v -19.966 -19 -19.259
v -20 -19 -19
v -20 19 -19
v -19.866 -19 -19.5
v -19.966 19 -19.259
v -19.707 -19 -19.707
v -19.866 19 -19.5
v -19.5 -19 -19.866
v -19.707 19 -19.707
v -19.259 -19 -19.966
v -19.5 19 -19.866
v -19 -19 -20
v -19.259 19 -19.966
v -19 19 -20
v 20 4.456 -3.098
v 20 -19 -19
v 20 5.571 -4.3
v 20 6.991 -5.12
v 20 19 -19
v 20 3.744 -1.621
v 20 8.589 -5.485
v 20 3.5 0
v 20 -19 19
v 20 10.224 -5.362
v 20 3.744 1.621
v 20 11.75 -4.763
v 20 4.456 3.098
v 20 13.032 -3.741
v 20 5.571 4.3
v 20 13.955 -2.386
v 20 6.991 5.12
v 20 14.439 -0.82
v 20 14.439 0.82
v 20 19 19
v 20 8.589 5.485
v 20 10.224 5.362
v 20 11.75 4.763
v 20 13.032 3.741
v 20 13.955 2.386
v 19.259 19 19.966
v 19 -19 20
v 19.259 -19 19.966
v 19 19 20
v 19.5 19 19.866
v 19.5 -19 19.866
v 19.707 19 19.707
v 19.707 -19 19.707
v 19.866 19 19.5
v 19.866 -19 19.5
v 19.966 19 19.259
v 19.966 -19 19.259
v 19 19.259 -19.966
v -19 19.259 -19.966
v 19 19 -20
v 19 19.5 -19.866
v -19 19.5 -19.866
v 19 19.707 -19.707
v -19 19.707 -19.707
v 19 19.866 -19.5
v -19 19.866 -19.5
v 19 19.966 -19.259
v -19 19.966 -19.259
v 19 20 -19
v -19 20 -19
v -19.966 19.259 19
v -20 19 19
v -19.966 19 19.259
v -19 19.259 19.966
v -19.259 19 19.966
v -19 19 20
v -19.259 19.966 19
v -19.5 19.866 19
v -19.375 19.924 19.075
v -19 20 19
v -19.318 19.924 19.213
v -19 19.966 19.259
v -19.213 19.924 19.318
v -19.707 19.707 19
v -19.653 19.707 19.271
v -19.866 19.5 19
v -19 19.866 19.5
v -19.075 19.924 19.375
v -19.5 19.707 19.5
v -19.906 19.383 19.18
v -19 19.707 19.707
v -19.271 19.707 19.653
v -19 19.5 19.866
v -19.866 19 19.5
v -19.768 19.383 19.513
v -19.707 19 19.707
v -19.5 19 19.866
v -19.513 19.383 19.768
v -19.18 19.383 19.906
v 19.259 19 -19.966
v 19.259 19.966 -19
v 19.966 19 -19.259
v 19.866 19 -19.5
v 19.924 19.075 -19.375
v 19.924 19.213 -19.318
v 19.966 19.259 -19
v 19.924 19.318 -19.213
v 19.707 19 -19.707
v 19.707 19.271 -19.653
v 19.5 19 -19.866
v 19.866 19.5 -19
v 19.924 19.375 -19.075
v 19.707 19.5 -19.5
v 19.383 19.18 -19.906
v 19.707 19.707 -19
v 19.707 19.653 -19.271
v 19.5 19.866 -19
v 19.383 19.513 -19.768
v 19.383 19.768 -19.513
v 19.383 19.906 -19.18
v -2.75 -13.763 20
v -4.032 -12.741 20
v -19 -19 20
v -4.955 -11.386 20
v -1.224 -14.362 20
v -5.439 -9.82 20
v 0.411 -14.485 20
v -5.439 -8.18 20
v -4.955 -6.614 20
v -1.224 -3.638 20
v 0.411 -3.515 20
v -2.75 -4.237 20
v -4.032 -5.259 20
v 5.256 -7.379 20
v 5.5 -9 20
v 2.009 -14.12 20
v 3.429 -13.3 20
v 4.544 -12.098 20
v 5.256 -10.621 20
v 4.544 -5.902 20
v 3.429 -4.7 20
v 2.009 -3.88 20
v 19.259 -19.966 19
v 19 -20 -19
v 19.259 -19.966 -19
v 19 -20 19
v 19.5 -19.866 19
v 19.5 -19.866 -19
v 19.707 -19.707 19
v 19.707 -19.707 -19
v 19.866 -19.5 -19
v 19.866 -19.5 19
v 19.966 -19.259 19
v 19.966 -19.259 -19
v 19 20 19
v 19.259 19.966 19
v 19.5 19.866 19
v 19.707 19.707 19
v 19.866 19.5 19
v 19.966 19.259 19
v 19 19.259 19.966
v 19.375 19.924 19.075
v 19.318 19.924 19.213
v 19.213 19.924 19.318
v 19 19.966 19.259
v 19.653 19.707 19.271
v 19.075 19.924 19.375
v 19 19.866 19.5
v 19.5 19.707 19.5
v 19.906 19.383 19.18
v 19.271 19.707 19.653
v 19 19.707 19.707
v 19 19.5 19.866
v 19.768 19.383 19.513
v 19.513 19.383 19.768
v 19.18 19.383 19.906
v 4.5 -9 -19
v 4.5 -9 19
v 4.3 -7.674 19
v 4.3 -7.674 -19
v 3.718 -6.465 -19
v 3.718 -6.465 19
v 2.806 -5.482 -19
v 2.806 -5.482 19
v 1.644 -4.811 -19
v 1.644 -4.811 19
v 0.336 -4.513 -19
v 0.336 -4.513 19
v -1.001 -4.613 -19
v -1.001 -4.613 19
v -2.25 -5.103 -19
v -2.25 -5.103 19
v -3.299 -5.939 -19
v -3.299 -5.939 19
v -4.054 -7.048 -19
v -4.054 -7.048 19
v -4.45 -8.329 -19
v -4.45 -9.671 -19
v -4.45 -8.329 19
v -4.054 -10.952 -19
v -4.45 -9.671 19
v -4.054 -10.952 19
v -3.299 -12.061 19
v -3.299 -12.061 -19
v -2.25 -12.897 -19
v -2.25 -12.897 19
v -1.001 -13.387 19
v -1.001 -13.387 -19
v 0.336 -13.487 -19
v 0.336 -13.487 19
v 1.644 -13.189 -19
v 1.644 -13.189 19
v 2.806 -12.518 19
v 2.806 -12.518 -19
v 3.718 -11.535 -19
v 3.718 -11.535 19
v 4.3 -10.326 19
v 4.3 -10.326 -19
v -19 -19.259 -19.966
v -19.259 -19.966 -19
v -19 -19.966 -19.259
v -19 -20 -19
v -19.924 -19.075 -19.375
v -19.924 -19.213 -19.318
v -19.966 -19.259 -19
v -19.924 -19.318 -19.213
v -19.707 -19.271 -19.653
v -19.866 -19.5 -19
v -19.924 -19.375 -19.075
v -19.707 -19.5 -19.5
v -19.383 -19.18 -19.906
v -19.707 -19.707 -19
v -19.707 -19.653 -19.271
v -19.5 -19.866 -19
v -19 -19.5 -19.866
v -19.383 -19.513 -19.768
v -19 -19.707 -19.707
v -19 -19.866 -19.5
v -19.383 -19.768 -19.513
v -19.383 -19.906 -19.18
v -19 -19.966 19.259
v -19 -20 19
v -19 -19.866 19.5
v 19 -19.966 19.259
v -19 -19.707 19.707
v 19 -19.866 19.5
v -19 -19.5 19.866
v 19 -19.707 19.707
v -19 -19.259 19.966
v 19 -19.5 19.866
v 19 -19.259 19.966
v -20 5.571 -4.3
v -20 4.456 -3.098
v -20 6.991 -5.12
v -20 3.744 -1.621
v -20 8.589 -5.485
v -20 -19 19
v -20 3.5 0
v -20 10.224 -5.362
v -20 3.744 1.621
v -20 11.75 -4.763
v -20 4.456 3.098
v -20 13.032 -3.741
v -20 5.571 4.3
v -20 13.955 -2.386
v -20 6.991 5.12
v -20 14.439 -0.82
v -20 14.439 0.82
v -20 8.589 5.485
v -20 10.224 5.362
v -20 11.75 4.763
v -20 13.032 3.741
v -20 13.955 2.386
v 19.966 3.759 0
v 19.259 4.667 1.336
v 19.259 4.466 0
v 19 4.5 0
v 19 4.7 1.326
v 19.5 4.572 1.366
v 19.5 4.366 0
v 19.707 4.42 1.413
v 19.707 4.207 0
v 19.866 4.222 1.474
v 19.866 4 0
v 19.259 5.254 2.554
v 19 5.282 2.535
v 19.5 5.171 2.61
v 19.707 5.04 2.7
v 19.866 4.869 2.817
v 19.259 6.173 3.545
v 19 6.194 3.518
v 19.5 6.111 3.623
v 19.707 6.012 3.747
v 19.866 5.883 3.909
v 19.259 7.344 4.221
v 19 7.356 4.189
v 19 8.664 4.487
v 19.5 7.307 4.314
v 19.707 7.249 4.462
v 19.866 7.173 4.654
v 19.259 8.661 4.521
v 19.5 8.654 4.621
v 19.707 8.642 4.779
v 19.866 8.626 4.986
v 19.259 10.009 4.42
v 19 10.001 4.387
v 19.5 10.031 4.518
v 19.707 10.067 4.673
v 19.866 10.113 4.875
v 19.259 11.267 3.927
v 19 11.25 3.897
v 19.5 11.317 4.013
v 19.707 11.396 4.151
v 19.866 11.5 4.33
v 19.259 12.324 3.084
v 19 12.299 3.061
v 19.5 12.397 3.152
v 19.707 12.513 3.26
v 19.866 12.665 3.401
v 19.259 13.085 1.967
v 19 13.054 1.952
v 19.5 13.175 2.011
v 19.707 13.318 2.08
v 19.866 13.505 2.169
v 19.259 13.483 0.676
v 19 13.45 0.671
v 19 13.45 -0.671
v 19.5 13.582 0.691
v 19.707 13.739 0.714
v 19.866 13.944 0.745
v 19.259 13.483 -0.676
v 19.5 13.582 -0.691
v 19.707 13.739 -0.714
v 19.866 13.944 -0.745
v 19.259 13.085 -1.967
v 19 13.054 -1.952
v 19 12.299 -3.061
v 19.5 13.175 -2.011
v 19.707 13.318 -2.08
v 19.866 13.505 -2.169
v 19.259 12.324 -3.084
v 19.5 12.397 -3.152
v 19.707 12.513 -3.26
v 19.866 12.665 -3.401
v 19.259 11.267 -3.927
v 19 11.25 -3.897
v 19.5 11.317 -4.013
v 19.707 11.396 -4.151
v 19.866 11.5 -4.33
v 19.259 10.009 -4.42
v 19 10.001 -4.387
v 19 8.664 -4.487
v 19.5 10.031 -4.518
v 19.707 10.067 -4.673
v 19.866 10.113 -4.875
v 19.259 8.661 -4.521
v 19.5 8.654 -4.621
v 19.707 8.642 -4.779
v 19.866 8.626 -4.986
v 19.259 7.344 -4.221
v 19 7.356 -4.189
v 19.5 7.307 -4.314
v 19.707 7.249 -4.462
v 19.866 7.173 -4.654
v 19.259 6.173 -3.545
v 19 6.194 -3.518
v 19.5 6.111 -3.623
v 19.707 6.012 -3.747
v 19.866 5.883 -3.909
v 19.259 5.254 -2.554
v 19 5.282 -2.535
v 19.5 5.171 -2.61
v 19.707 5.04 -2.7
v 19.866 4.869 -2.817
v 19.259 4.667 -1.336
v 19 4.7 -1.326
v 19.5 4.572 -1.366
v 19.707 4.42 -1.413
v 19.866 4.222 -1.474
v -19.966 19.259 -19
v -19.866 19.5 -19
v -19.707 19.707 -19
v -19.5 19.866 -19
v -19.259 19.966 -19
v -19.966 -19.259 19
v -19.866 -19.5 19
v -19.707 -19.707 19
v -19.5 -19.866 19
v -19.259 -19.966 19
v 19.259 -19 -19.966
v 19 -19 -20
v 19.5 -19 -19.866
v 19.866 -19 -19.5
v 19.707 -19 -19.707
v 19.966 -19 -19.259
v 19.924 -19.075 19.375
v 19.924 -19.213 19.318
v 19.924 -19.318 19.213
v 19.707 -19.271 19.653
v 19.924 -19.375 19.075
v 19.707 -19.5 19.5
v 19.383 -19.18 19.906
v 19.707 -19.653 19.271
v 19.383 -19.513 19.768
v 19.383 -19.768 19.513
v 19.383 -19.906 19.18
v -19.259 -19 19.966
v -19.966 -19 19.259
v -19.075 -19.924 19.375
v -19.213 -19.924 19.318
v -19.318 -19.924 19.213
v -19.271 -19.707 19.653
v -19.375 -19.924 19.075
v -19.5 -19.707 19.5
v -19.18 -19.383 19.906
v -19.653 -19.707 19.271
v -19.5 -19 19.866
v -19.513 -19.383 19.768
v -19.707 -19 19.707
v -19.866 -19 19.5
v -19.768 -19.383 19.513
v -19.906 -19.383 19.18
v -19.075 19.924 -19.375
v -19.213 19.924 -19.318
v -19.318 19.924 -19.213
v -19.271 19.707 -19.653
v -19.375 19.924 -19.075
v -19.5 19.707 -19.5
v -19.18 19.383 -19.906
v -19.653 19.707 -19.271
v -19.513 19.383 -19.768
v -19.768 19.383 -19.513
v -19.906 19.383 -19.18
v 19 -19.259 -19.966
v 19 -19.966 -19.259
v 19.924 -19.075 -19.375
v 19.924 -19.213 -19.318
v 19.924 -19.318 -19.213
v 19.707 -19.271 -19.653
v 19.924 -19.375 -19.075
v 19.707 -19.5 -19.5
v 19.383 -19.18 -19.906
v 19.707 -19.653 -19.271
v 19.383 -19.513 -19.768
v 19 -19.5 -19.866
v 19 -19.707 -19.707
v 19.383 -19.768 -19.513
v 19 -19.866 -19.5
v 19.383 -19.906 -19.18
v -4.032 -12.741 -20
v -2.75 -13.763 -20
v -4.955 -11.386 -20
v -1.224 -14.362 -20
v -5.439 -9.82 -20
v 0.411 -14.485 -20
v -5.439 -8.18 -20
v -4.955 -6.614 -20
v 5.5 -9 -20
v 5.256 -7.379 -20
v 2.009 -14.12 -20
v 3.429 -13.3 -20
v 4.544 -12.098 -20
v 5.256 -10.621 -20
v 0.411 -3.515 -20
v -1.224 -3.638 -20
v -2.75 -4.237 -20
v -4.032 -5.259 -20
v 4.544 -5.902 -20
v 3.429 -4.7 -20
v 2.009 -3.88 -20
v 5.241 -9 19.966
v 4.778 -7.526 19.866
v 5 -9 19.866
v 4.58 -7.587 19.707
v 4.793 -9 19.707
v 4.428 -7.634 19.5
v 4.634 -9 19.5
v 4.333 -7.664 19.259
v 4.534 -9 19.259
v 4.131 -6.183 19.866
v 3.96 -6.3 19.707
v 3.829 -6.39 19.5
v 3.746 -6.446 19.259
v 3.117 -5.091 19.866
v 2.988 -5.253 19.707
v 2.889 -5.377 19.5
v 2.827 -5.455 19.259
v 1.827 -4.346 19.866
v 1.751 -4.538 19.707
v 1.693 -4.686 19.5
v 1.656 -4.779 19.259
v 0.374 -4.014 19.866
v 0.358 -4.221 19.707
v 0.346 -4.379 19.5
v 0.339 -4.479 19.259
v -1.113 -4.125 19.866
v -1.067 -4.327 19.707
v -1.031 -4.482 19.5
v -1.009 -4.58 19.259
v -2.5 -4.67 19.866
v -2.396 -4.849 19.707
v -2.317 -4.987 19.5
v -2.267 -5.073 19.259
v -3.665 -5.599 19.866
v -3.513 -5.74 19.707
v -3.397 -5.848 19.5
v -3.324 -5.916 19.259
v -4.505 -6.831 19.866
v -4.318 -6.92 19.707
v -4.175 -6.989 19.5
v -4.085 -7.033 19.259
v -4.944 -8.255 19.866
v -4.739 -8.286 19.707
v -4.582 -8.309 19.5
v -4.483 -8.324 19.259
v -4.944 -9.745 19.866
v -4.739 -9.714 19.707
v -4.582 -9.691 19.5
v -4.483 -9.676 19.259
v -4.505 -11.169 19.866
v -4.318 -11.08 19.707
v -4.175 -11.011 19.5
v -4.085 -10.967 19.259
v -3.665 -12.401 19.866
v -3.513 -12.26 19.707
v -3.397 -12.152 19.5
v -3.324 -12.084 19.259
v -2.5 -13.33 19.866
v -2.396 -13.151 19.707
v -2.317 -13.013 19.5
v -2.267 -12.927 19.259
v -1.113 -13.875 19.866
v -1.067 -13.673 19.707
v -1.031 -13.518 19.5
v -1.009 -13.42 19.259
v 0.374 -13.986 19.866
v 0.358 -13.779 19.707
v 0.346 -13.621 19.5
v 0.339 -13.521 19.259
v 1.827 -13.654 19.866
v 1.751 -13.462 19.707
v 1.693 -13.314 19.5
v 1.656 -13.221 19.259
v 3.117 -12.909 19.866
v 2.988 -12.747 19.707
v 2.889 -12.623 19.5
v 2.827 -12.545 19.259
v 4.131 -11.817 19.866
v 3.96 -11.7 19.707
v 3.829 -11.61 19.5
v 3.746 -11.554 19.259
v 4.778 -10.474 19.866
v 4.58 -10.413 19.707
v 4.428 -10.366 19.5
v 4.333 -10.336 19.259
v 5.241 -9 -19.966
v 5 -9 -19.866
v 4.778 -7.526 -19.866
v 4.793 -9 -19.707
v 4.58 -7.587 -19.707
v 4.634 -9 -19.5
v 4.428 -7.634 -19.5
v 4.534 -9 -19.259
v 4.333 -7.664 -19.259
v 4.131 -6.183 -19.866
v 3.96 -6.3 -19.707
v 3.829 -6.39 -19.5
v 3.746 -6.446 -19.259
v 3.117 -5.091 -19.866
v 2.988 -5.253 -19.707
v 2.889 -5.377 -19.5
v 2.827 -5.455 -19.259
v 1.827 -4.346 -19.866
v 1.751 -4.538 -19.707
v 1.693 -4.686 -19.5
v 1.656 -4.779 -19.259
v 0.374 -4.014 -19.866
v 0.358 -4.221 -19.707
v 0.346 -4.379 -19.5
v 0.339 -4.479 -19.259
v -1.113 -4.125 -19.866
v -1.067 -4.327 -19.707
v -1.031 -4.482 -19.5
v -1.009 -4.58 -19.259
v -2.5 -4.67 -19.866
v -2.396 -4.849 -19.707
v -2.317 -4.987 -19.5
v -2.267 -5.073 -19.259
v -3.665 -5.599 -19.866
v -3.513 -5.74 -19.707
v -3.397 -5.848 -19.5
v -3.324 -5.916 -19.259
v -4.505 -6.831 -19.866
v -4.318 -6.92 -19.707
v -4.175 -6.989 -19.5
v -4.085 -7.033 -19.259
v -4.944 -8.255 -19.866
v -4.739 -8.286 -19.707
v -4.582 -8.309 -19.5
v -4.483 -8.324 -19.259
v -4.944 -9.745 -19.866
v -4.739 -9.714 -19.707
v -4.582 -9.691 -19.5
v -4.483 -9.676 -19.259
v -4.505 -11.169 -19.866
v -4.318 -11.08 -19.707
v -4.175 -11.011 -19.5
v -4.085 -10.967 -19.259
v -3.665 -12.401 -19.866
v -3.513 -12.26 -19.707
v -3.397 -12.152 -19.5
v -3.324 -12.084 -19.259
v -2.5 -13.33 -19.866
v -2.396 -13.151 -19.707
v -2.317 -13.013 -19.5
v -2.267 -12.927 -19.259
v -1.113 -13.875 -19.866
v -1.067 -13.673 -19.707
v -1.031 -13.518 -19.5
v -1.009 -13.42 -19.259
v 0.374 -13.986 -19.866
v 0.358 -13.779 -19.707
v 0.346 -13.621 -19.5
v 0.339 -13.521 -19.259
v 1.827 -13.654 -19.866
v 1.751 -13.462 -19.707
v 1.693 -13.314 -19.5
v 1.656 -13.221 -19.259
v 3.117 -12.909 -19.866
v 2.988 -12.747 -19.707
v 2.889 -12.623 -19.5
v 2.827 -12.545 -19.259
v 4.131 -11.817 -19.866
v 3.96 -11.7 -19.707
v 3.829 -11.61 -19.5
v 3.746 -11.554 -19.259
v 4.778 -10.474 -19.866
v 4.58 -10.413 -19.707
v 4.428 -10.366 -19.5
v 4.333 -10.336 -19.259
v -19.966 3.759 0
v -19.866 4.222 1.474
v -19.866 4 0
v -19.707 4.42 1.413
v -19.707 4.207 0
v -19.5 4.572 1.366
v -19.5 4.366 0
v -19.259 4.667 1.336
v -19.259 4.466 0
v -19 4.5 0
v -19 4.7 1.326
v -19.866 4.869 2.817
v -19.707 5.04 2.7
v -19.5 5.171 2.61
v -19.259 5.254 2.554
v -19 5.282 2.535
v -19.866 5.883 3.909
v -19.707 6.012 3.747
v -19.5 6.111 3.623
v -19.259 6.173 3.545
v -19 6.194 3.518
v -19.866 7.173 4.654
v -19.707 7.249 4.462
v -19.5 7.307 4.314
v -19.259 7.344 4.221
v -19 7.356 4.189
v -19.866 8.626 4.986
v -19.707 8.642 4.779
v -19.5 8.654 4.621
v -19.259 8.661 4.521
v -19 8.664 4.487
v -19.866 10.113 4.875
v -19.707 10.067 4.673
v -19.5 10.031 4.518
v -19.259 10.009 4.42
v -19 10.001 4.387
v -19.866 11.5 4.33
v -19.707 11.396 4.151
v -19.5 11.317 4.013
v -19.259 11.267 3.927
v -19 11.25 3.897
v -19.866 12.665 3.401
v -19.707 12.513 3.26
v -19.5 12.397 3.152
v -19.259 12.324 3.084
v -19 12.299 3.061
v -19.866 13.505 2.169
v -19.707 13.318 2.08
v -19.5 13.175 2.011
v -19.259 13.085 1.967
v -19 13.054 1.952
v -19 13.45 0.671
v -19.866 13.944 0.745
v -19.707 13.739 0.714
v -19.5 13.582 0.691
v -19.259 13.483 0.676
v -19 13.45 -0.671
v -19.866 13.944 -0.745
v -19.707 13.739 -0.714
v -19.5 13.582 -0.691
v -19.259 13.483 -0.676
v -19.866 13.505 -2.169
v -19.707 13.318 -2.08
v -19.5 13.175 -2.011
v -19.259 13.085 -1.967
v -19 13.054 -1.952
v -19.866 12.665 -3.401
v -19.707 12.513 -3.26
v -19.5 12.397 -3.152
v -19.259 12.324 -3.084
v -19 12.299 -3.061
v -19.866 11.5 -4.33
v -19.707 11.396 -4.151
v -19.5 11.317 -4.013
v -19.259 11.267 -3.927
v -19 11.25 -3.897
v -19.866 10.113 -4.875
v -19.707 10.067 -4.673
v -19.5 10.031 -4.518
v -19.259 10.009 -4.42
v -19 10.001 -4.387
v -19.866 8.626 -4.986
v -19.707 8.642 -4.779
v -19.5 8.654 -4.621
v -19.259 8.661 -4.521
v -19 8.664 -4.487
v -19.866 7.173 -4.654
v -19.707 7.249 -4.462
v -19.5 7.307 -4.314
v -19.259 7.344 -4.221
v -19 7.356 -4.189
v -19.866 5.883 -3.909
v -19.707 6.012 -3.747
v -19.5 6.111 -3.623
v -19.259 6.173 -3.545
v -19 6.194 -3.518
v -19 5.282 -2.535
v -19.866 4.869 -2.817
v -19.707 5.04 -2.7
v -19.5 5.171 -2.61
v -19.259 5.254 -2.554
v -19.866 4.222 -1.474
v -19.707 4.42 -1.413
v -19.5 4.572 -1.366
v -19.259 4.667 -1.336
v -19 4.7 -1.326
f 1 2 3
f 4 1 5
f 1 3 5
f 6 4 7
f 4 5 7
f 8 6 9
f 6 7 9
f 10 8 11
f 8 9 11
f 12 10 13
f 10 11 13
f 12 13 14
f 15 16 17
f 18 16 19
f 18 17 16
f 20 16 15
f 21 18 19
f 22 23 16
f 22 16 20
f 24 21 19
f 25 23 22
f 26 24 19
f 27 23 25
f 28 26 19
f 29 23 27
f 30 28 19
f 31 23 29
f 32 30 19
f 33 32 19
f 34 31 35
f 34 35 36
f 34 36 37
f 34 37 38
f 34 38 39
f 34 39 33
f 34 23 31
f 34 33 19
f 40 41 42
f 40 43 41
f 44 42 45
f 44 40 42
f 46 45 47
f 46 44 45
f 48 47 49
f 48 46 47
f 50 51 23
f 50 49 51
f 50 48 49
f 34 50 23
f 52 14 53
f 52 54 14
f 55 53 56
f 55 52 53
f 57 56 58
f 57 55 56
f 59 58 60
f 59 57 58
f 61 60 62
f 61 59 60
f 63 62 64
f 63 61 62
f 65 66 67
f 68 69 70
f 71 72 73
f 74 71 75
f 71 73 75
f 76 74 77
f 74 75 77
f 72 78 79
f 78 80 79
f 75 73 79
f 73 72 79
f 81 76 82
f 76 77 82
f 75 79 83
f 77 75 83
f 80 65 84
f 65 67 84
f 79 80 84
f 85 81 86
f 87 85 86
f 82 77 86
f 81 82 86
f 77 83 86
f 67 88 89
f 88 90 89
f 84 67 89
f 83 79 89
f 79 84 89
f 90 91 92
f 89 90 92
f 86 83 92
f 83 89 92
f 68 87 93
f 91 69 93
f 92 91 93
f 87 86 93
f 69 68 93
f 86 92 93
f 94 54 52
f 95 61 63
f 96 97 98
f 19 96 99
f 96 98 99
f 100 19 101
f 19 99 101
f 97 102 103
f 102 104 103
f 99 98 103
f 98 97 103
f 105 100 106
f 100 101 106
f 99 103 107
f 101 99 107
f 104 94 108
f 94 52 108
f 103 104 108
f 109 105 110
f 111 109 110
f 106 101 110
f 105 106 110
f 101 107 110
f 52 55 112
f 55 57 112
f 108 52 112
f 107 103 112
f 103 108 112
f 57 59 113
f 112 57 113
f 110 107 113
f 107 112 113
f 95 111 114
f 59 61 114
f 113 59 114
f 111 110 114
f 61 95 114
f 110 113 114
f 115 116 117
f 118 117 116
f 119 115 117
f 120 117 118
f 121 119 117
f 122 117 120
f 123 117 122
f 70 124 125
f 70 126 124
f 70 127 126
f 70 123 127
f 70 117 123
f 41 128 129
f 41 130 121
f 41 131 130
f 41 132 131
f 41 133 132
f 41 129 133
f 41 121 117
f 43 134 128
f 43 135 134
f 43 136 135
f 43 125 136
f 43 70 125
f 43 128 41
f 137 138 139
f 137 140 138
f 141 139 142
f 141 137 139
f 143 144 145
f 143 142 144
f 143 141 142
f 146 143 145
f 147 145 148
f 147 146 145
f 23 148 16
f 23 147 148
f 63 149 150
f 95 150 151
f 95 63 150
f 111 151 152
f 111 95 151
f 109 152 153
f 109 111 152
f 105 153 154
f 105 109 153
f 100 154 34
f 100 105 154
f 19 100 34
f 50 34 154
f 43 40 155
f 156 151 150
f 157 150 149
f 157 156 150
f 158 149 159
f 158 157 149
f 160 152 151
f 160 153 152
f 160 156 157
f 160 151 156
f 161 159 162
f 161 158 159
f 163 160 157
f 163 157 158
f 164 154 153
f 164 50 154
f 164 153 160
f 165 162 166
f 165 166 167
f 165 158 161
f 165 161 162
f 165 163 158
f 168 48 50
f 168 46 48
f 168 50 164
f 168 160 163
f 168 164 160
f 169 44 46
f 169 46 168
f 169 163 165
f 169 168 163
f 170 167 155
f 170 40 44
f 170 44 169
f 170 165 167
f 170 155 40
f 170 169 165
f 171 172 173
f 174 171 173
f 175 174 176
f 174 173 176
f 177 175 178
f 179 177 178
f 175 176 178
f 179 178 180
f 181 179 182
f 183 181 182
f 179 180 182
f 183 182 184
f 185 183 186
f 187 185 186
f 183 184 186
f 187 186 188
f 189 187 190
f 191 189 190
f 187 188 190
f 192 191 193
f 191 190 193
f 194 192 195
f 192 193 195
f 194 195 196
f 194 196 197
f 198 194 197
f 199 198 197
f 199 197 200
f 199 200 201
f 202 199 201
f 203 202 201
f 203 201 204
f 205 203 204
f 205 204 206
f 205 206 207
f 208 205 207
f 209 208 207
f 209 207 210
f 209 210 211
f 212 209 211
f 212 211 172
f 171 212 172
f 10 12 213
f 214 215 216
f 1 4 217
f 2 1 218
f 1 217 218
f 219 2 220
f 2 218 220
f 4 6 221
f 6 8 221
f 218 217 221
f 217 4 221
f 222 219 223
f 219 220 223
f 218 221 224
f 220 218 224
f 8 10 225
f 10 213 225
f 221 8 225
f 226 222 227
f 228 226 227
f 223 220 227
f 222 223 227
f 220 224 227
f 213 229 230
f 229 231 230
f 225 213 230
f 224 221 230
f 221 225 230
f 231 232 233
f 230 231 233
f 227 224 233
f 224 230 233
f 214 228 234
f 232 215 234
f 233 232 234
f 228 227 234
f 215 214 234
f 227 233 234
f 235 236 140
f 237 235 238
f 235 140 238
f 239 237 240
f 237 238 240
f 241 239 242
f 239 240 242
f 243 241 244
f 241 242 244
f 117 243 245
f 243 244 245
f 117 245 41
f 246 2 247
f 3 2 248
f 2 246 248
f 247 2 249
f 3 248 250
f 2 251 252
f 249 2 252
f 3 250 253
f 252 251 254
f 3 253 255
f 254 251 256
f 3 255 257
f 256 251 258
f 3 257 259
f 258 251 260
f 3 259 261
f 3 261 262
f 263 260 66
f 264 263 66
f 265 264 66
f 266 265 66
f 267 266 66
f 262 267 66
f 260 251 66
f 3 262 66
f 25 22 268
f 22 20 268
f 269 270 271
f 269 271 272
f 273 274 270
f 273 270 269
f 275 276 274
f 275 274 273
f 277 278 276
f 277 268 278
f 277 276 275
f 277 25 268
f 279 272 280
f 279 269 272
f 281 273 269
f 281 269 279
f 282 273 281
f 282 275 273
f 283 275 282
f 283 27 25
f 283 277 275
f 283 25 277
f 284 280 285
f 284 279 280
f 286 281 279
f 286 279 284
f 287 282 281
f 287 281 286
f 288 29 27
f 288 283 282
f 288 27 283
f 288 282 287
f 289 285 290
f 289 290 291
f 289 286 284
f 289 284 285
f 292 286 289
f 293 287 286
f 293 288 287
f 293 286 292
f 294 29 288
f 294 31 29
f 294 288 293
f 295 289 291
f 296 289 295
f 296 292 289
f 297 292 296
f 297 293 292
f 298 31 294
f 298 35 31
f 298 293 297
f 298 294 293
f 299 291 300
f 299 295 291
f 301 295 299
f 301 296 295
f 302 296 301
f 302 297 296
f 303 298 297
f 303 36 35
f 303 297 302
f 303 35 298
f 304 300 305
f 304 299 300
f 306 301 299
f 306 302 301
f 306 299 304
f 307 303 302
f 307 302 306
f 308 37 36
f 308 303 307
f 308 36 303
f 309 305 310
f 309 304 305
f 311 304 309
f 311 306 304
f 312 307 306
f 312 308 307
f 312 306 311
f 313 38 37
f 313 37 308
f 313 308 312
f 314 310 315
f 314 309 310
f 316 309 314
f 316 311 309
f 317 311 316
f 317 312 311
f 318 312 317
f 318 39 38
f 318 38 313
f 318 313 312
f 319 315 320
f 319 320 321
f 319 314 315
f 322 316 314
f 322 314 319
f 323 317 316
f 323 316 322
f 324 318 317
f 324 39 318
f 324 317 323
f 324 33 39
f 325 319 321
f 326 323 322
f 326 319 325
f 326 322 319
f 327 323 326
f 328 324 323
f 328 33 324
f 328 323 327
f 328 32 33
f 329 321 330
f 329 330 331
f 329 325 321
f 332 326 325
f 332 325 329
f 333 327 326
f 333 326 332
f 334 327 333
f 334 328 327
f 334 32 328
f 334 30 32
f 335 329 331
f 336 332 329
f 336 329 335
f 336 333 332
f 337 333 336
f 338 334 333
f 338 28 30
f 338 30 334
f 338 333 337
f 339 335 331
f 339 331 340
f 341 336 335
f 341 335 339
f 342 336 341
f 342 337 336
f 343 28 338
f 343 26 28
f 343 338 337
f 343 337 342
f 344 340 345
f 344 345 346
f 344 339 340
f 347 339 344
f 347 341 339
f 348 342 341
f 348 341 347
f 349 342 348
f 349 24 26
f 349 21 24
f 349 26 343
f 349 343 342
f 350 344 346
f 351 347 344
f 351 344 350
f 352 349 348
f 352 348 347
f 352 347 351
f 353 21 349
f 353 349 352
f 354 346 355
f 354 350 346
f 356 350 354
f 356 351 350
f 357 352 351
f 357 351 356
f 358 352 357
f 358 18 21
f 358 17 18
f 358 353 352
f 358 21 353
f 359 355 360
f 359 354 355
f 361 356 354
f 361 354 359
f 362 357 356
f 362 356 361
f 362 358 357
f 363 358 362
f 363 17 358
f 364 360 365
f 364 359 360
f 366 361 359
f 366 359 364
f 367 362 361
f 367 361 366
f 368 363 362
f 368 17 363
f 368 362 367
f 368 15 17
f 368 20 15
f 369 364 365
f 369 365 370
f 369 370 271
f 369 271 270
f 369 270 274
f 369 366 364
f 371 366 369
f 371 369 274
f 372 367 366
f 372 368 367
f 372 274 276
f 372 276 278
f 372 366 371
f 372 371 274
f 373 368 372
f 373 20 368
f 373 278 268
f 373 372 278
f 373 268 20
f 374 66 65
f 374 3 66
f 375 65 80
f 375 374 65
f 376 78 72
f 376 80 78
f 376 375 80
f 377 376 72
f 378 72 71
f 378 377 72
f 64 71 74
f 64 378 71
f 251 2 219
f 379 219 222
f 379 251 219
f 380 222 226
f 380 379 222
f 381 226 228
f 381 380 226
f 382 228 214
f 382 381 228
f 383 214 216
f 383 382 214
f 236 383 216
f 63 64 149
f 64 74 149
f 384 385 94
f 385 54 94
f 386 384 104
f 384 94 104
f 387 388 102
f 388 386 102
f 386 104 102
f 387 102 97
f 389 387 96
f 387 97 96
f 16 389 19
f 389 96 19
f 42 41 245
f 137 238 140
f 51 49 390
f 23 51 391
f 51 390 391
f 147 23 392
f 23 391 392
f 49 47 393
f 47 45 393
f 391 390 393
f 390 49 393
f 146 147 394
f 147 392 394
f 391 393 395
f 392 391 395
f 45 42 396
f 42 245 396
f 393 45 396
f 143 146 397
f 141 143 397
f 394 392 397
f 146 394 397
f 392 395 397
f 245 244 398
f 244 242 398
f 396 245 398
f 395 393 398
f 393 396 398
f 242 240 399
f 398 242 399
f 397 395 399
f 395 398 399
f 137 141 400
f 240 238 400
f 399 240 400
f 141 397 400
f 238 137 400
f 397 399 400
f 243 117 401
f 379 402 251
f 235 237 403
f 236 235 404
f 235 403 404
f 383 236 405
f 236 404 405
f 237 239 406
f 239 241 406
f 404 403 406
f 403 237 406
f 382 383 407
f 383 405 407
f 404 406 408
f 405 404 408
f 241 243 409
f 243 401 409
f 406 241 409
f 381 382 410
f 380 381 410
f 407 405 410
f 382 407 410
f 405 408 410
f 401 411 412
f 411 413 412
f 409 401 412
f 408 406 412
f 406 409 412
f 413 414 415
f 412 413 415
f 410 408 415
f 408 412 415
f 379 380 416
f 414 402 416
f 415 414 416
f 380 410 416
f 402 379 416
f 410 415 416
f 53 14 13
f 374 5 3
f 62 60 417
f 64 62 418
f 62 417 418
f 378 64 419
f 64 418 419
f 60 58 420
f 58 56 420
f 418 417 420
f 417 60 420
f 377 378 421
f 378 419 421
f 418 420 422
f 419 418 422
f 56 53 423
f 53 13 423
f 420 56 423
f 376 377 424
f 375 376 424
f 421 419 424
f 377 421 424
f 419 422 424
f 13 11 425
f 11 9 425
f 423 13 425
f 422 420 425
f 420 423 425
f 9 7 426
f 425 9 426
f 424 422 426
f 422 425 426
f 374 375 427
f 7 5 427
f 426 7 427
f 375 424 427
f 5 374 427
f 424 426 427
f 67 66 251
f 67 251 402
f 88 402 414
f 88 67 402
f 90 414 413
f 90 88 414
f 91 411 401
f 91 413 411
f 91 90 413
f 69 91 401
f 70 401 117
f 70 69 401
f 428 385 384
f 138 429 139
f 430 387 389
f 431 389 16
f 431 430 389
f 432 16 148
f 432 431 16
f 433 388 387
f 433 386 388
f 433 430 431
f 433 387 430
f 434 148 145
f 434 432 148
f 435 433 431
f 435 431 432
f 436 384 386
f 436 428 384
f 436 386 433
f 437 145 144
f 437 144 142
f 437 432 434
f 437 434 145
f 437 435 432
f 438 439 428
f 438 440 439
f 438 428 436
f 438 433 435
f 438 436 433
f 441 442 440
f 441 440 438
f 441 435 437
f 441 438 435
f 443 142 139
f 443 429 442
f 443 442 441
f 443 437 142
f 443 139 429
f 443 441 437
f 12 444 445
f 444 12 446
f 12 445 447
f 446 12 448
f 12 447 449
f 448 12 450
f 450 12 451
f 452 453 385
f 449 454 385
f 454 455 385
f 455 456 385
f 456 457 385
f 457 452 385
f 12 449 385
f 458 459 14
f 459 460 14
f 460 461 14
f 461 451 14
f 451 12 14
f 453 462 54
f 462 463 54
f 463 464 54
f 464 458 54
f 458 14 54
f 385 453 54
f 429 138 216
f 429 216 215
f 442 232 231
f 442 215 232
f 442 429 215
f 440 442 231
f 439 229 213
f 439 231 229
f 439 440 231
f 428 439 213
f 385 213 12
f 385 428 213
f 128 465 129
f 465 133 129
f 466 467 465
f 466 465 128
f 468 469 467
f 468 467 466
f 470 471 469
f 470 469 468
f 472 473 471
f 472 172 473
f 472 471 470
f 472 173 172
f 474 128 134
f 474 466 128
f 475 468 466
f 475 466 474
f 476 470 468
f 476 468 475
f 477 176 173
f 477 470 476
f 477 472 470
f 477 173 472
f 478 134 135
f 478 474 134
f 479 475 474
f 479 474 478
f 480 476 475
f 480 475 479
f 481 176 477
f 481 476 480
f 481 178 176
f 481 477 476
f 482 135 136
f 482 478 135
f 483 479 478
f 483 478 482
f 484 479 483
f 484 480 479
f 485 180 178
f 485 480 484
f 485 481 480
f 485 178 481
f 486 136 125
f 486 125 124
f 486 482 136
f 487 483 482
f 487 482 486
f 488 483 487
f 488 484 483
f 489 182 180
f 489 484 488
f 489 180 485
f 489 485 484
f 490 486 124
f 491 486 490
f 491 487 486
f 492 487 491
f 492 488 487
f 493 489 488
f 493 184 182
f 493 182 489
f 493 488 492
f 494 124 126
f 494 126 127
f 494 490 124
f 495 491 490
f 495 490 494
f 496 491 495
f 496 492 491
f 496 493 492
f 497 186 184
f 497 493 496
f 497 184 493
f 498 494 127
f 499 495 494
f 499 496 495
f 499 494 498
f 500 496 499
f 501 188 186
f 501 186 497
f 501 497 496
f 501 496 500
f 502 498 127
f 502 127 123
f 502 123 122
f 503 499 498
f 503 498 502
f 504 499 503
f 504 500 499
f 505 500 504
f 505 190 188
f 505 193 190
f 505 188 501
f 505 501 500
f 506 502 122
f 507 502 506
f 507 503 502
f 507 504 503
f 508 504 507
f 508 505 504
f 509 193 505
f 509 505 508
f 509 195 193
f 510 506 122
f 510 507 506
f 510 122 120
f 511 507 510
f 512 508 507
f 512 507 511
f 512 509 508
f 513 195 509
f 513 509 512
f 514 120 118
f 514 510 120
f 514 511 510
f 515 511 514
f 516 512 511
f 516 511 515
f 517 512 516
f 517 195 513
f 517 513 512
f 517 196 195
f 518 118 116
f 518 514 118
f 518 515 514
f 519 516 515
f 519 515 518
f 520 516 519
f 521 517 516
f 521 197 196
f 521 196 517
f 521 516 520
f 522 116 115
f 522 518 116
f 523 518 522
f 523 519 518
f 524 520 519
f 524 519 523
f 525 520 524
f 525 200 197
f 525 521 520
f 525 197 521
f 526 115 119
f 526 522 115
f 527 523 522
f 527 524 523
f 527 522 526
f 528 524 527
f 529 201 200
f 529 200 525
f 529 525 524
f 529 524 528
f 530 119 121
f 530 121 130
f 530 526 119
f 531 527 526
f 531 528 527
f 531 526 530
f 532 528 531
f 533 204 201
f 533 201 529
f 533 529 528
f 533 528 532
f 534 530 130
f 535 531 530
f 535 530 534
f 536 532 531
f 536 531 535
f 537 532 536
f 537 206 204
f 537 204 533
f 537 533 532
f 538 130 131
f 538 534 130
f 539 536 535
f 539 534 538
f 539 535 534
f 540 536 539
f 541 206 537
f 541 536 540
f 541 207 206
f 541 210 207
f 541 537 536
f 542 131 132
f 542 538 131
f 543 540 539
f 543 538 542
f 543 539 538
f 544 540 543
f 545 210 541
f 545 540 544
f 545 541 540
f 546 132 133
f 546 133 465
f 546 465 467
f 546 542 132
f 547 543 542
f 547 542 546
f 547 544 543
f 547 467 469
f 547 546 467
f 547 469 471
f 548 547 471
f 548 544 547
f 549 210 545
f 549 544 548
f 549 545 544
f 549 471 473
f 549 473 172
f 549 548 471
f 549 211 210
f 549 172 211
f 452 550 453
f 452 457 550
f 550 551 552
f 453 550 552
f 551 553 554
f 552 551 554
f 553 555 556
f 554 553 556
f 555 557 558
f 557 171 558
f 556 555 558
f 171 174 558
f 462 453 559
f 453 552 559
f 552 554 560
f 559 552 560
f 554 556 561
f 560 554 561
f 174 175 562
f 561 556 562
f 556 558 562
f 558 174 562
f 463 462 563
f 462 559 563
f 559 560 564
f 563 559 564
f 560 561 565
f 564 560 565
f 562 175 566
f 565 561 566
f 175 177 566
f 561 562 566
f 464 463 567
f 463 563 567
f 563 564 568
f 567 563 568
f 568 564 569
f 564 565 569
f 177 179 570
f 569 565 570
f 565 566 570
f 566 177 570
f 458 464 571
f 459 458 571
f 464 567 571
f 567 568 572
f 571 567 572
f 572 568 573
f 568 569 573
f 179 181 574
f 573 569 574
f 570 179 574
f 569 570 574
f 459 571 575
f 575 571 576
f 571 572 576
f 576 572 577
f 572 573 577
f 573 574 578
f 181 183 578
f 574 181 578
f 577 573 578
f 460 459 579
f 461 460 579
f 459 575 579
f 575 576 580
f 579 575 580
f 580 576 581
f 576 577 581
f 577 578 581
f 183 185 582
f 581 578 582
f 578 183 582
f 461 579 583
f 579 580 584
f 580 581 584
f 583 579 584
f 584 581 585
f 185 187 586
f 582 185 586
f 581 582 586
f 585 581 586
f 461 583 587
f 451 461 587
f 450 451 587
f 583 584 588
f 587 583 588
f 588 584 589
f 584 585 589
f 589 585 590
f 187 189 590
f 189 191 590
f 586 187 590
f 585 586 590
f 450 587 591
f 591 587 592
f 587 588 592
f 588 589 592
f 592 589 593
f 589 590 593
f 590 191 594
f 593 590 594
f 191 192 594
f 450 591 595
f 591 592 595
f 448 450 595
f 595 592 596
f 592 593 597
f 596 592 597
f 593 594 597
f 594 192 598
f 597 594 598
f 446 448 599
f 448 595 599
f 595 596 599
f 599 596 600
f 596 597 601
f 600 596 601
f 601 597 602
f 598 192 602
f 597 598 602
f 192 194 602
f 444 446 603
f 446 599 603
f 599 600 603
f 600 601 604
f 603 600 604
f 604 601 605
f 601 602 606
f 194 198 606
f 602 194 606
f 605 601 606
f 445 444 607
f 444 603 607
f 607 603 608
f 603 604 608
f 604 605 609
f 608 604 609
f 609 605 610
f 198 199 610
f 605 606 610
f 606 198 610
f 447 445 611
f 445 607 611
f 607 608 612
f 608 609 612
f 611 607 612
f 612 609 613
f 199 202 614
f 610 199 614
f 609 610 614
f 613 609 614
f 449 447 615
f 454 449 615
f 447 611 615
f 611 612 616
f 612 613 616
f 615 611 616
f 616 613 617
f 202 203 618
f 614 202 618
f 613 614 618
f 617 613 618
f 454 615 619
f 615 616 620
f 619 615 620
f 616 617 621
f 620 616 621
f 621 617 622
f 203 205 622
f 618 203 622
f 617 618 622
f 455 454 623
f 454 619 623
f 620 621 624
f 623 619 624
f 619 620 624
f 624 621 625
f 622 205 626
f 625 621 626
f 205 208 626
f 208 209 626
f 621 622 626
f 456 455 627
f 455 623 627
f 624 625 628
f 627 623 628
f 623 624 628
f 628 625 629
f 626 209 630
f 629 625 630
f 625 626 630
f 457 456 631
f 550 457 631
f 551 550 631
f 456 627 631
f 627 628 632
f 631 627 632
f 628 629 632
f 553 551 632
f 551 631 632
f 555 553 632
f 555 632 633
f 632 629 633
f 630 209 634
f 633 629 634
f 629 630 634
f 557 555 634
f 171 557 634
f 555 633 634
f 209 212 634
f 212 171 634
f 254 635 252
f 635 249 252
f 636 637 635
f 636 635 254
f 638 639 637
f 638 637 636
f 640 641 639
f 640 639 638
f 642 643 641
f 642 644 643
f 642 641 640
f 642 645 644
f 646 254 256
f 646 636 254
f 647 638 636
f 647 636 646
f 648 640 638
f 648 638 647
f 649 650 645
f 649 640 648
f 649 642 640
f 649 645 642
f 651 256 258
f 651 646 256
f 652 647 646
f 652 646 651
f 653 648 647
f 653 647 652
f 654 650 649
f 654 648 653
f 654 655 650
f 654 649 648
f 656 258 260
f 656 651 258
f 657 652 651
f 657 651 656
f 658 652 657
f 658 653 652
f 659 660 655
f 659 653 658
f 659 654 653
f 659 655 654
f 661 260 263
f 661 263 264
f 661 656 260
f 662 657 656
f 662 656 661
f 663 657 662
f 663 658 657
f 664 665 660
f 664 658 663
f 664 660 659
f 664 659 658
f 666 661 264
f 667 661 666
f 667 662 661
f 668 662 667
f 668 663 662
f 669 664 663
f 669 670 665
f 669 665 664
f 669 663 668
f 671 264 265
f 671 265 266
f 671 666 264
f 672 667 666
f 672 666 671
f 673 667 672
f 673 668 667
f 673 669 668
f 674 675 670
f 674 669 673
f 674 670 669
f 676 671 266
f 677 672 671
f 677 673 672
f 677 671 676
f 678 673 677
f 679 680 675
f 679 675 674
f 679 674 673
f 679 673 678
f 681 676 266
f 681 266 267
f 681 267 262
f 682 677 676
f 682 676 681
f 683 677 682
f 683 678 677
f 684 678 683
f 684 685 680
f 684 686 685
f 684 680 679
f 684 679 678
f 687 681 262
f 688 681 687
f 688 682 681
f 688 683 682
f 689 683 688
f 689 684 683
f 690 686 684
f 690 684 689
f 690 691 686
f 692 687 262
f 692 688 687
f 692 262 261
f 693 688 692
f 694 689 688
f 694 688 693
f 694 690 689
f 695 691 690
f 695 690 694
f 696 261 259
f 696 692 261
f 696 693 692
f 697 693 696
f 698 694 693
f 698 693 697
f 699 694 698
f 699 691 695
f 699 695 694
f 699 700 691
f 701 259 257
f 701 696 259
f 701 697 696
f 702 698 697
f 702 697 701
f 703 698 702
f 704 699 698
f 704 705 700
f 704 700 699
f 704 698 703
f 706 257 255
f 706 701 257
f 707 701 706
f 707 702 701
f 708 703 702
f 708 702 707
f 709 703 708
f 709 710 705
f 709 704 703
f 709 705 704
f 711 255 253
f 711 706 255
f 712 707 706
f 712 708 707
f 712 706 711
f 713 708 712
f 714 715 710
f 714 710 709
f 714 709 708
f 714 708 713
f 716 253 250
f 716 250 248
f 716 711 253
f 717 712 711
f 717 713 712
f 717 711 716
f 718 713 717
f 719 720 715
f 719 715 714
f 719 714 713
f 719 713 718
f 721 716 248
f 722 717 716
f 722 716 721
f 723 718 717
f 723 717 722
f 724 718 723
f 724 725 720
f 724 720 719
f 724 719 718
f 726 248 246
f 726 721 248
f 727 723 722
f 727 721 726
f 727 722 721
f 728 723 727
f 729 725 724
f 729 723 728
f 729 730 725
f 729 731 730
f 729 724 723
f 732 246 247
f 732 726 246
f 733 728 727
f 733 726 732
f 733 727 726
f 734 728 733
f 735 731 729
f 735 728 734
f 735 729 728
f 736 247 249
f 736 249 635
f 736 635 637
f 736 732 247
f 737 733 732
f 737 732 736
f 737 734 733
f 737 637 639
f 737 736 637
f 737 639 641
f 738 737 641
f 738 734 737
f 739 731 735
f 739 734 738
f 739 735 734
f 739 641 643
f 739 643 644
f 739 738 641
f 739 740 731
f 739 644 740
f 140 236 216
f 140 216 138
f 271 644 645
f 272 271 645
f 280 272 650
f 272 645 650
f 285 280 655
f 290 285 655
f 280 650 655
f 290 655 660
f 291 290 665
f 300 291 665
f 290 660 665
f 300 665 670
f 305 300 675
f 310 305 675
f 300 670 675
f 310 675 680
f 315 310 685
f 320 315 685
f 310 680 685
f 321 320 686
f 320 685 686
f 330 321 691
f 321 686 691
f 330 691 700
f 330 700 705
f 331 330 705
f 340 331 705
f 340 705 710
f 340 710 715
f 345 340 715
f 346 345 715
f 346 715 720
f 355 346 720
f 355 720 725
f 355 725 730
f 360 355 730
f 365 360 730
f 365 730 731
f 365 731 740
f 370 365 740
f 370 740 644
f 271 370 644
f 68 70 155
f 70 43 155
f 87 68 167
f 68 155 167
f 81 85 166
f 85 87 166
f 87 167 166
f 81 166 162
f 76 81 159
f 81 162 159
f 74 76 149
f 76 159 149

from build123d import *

# Parameters (mm, degrees)
SKETCH1_W           = 40
SKETCH1_H           = 40
BOSS_EXTRUDE1_DEPTH = 20
SKETCH2_R           = 4.5
CUT_EXTRUDE1_DEPTH  = 49.989794856
SKETCH3_R           = 4.5
CUT_EXTRUDE2_DEPTH  = 49.989794856
FILLET1_R           = 1


with BuildPart() as part:
    # Sketch1 → Boss-Extrude1 (new, symmetric)
    with BuildSketch(Plane.XY):
        Rectangle(SKETCH1_W, SKETCH1_H)
    extrude(amount=BOSS_EXTRUDE1_DEPTH, both=True)

    # Sketch2 → Cut-Extrude1 (cut, through all)
    with BuildSketch(Plane.XY.offset(20)):
        with Locations((0, -9)):
            Circle(SKETCH2_R)
    extrude(amount=-CUT_EXTRUDE1_DEPTH, mode=Mode.SUBTRACT)

    # Sketch3 → Cut-Extrude2 (cut, through all)
    with BuildSketch(Plane.ZY.offset(20)):
        with Locations(Location((0, 9, 0), (0, 0, 270))):
            Circle(SKETCH3_R)
    extrude(amount=-CUT_EXTRUDE2_DEPTH, mode=Mode.SUBTRACT)

    # Fillet1
    fillet1_edges = [part.edges().sort_by_distance(p)[0] for p in [
        (-20, 0, 20),
        (-4.5, -9, -20),
        (-4.5, -9, 20),
        (0, -20, 20),
        (20, 13.5, 0),
        (-20, 13.5, 0),
        (20, 0, 20),
        (0, -20, -20),
        (-20, 0, -20),
        (0, 20, -20),
        (20, 0, -20),
        (20, -20, 0),
        (-20, -20, 0),
        (-20, 20, 0),
        (20, 20, 0),
        (0, 20, 20),
    ]]
    fillet(fillet1_edges, radius=FILLET1_R)


solid = part.part
